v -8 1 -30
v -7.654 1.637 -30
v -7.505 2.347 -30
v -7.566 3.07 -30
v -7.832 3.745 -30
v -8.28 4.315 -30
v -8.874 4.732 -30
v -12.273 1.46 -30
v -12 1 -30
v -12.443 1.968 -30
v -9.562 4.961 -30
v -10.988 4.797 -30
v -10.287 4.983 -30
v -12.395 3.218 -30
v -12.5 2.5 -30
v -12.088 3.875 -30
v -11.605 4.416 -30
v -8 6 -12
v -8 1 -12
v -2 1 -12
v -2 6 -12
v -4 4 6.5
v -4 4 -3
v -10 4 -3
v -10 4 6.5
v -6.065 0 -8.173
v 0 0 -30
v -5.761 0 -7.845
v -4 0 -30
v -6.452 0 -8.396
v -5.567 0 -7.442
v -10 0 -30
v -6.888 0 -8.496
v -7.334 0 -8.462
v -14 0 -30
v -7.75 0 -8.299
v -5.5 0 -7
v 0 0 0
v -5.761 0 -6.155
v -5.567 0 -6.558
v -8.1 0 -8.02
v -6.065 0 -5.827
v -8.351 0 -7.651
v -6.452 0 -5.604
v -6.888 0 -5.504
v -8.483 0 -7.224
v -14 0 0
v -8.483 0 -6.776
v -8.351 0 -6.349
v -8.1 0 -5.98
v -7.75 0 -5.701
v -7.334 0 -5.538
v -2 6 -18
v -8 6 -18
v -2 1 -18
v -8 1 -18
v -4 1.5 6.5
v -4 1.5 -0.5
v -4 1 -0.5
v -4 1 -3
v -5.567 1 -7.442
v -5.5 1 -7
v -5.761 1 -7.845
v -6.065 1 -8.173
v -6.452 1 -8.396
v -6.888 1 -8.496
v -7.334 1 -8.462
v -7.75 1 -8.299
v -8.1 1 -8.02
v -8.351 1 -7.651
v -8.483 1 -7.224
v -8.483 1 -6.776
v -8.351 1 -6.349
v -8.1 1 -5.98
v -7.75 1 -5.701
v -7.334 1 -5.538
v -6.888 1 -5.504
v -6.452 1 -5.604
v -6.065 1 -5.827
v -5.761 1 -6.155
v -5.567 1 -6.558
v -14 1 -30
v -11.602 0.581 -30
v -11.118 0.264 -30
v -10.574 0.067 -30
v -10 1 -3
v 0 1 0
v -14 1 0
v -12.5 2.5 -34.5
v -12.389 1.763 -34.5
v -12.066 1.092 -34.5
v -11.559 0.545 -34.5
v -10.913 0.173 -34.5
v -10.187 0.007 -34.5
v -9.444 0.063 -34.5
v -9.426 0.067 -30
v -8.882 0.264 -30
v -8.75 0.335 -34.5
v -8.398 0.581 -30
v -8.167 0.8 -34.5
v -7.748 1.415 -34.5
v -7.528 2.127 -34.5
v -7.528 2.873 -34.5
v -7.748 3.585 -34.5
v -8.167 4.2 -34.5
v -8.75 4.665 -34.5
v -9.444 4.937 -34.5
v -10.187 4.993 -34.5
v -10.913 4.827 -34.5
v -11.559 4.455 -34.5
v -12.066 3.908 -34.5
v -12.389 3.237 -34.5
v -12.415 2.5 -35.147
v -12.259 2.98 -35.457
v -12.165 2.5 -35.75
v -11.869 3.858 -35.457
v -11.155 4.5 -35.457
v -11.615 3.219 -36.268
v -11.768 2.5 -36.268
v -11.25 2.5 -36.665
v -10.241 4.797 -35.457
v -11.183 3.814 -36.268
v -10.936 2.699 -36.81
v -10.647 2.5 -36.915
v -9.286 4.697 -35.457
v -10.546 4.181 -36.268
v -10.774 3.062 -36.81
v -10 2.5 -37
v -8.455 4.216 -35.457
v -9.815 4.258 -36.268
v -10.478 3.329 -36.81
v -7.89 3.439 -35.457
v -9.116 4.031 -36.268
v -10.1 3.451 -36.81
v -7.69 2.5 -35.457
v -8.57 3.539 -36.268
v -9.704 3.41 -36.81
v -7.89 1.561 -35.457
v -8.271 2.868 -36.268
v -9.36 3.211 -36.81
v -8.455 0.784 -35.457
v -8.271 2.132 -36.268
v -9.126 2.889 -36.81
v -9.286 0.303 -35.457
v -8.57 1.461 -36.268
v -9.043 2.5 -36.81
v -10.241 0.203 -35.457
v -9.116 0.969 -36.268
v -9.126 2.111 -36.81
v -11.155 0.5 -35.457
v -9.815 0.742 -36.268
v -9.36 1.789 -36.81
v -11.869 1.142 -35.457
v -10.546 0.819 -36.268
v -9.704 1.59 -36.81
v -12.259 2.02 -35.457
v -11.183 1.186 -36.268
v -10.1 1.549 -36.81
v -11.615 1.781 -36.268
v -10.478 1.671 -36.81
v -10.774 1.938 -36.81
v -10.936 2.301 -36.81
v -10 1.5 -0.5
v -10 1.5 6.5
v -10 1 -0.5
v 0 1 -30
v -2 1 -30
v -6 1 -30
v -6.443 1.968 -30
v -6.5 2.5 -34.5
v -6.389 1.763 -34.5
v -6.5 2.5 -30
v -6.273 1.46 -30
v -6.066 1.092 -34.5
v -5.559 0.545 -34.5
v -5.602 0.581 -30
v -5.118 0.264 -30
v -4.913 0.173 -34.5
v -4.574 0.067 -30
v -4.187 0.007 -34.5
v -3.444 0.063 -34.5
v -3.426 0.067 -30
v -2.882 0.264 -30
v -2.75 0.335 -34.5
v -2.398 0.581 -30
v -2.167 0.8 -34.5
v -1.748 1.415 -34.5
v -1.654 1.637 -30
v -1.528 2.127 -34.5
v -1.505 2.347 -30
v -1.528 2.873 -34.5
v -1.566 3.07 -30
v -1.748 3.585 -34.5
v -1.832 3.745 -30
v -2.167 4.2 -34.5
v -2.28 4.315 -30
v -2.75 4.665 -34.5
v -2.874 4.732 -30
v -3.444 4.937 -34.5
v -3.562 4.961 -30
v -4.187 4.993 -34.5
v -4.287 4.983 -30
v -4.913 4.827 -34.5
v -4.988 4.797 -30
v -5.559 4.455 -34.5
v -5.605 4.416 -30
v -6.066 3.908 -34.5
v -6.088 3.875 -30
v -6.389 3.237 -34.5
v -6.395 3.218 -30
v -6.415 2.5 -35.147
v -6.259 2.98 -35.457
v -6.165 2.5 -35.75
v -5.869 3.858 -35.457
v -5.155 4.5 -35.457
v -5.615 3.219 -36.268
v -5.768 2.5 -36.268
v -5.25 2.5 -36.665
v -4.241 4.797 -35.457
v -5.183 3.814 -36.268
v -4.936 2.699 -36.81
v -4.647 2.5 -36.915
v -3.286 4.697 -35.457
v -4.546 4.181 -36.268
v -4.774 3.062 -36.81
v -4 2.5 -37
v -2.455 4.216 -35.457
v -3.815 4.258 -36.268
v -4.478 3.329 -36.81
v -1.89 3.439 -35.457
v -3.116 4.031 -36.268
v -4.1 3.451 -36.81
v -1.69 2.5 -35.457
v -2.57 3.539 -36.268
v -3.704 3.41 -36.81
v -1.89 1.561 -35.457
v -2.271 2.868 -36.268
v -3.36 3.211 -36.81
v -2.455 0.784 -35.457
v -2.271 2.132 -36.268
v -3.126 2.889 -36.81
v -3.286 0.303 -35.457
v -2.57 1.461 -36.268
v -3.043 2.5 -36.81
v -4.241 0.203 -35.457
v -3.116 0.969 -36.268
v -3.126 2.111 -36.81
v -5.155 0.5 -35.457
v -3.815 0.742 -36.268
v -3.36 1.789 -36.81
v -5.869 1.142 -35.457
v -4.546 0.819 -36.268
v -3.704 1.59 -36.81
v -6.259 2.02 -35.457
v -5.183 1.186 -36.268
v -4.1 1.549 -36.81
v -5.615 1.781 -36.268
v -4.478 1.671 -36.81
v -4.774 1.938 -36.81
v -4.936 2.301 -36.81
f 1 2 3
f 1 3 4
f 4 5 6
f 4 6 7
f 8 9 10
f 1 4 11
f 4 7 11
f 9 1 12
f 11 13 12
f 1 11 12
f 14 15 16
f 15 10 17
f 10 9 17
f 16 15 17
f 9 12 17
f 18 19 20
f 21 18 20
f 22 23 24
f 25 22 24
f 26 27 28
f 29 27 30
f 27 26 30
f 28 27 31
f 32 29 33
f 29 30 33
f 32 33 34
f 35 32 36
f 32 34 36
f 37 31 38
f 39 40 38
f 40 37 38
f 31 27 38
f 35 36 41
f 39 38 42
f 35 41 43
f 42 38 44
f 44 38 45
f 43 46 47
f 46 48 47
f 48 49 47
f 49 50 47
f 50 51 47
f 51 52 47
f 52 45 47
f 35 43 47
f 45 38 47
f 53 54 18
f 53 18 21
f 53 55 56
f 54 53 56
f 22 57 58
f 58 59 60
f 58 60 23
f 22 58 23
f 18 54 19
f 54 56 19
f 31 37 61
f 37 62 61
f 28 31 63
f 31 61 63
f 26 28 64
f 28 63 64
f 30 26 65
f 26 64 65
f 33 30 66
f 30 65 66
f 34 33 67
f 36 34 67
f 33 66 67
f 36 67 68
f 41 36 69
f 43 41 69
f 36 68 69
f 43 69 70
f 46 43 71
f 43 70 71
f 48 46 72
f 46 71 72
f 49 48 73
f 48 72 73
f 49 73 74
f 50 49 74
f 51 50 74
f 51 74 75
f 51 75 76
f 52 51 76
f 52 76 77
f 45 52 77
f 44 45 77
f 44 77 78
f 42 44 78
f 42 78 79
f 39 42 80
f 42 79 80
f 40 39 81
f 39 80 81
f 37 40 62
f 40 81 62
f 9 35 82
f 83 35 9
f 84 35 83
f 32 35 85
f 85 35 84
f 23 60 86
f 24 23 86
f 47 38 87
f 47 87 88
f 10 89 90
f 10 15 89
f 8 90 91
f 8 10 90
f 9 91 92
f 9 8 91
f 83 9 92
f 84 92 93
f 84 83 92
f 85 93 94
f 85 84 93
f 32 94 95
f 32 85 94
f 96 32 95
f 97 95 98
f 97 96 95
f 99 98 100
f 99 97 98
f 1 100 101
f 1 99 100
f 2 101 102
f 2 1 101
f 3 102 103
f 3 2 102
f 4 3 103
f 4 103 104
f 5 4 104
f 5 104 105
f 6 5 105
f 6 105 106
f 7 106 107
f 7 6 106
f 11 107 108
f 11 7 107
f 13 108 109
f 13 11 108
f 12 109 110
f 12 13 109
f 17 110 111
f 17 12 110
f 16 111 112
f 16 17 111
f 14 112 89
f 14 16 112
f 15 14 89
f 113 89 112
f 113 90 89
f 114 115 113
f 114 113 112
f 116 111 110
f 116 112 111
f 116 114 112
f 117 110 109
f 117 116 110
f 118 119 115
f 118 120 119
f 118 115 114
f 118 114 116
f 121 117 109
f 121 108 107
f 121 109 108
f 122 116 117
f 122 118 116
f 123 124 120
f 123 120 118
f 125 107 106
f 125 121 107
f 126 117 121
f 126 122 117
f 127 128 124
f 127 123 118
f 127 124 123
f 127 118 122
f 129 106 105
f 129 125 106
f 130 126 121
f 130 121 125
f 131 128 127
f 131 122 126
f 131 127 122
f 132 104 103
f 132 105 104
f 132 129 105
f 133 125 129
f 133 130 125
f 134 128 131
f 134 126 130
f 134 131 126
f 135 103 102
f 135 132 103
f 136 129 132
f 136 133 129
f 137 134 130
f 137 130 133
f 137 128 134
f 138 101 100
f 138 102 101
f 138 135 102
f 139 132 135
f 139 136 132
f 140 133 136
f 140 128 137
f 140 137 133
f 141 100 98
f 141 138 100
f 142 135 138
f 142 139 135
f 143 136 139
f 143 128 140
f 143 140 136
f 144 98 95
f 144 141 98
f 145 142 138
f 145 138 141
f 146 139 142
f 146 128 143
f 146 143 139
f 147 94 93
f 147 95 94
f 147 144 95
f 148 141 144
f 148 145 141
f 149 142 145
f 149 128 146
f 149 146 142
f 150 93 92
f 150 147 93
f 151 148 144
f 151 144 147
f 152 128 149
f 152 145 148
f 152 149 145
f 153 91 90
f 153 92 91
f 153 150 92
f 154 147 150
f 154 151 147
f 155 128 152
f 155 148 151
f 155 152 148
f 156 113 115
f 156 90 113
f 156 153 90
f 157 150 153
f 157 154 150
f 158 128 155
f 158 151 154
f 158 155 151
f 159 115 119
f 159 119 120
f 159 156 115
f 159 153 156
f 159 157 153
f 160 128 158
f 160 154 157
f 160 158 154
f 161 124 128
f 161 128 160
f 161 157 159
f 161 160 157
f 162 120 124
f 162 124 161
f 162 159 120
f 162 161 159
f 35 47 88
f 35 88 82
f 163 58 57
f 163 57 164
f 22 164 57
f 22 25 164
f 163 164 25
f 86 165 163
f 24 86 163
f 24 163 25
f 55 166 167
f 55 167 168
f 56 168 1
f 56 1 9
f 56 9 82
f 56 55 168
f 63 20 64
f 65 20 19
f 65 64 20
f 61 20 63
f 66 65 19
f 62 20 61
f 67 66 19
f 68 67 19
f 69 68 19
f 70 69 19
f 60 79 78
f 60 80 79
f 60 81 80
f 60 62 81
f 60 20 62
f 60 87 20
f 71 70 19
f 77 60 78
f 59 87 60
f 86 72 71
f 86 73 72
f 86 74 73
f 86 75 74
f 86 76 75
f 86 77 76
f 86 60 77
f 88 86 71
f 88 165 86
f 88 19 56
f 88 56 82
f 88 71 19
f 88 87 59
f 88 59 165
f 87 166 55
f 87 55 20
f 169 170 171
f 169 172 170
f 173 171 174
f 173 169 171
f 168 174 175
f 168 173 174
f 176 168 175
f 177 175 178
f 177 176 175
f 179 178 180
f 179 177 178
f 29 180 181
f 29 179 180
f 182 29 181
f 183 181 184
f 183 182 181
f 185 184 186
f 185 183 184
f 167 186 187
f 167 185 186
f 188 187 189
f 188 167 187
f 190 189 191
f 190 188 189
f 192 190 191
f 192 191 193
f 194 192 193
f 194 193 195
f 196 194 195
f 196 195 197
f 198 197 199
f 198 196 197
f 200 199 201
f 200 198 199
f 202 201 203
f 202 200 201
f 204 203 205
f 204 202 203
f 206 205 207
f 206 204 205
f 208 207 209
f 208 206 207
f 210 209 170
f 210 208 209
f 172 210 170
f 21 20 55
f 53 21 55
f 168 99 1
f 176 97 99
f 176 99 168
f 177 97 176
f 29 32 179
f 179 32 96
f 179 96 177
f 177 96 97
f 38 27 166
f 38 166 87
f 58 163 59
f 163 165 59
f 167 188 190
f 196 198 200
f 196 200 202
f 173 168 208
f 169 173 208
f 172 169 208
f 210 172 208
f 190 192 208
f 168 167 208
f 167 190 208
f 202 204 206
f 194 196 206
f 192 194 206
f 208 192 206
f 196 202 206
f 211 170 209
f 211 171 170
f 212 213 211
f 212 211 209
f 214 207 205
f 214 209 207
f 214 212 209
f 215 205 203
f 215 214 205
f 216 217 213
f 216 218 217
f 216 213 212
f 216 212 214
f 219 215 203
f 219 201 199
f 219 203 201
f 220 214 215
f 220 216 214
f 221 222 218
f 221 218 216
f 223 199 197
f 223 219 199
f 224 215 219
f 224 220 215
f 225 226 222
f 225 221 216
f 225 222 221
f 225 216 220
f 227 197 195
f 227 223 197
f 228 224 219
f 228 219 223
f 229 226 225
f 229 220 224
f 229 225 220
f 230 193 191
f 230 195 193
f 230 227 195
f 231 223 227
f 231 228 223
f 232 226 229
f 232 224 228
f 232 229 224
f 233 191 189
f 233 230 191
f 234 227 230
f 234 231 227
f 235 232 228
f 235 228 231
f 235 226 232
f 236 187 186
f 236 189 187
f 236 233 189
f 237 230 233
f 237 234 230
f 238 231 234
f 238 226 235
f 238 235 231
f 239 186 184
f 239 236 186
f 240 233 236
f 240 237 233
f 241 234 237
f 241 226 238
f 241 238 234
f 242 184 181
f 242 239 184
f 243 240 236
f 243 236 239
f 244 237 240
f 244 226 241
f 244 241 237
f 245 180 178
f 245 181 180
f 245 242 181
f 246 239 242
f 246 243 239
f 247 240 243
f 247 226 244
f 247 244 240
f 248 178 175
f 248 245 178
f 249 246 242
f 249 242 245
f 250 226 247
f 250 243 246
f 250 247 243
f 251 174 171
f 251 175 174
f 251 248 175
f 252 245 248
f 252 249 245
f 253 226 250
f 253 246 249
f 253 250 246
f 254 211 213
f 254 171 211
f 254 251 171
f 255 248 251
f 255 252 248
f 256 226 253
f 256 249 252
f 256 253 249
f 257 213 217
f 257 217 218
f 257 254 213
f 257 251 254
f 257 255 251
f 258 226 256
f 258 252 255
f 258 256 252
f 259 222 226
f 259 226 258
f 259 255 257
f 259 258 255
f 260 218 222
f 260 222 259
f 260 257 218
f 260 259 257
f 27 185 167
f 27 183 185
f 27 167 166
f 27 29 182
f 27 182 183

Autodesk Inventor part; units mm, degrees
ref_plane "YZ Plane" through (0, 0, 0) normal (1, 0, 0) x (0, 1, 0)
ref_plane "XZ Plane" through (0, 0, 0) normal (0, 1, 0) x (-1, 0, 0)
ref_plane "XY Plane" through (0, 0, 0) normal (0, 0, 1) x (1, 0, 0)
sketch "Sketch1" plane through (0, 0, 0) normal (0, 1, 0) x (-1, 0, 0)
  line L0 (0, 0) -> (14, 0)
  line L1 (14, 0) -> (14, -30)
  line L2 (14, -30) -> (0, -30)
  line L3 (0, -30) -> (0, 0)
  dimension "d0" = 14
  dimension "d1" = 30
extrude "Extrusion1" add sketch "Sketch1" along normal blind 1
sketch "Sketch2" plane through (0, 0, -30) normal (0, 0, -1) x (-1, 0, 0)
  circle A0 centre (4, 2.5) radius 2.5
  circle A1 centre (10, 2.5) radius 2.5
  line L0 (0, 0) -> (14, 0) projected
  line L1 (14, 0) -> (14, 1) projected
  line L2 (0, 0) -> (0, 1) projected
  point P0 (14, 0.5)
  point P1 (0, 0.5)
  dimension "d4" = 5
  dimension "d5" = 5
  dimension "d6" = 2.5
  dimension "d7" = 4
  dimension "d8" = 4
extrude "Extrusion2" add sketch "Sketch2" along normal blind 7
fillet "Fillet1" radius 2.5 2 edges at (-1.5, 2.5, -37) (-7.5, 2.5, -37)
sketch "Sketch3" plane through (0, 1, 0) normal (0, 1, 0) x (1, 0, 0)
  line L0 (-10, 0.5) -> (-4, 0.5)
  line L1 (-4, 0.5) -> (-4, 3)
  line L2 (-4, 3) -> (-10, 3)
  line L3 (-10, 3) -> (-10, 0.5)
  line L4 (0, 0) -> (0, 30) projected
  line L5 (-14, 0) -> (0, 0) projected
  point P0 (-7, 0.5)
  dimension "d12" = 6
  dimension "d13" = 4
  dimension "d14" = 2.5
  dimension "d15" = 0.5
extrude "Extrusion3" add sketch "Sketch3" along normal blind 3
sketch "Sketch4" plane through (-10, 1, -0.5) normal (0, 0, 1) x (1, 0, 0)
  line L0 (6, 3) -> (0, 3) projected
  line L1 (6, 0) -> (6, 3) projected
  line L2 (0, 3) -> (6, 3)
  line L3 (6, 3) -> (6, 0.5)
  line L4 (6, 0.5) -> (0, 0.5)
  line L5 (0, 0.5) -> (0, 3)
  point P0 (10, -1)
  dimension "d18" = 2.5
extrude "Extrusion4" add sketch "Sketch4" along normal blind 7
sketch "Sketch5" plane through (0, 1, 0) normal (0, 1, 0) x (1, 0, 0)
  line L0 (-2, 18) -> (-8, 18)
  line L1 (-8, 18) -> (-8, 12)
  line L2 (-8, 12) -> (-2, 12)
  line L3 (-2, 12) -> (-2, 18)
  line L4 (0, 0) -> (0, 30) projected
  line L5 (-1.5, 30) -> (-6.5, 30) projected
  point P0 (-2, 15)
  point P1 (-6, 30)
  point P2 (-2, 30)
  dimension "d21" = 6
  dimension "d22" = 6
  dimension "d23" = 2
  dimension "d24" = 12
extrude "Extrusion5" add sketch "Sketch5" along normal blind 5
sketch "Sketch6" plane through (0, 1, 0) normal (0, 1, 0) x (1, 0, 0)
  circle A0 centre (-7, 7) radius 1.5
  line L0 (-14, 0) -> (0, 0) projected
  line L1 (0, 0) -> (0, 30) projected
  dimension "d27" = 3
  dimension "d28" = 7
  dimension "d29" = 7
extrude "Extrusion6" cut sketch "Sketch6" against normal through all
properties part number "IR"
